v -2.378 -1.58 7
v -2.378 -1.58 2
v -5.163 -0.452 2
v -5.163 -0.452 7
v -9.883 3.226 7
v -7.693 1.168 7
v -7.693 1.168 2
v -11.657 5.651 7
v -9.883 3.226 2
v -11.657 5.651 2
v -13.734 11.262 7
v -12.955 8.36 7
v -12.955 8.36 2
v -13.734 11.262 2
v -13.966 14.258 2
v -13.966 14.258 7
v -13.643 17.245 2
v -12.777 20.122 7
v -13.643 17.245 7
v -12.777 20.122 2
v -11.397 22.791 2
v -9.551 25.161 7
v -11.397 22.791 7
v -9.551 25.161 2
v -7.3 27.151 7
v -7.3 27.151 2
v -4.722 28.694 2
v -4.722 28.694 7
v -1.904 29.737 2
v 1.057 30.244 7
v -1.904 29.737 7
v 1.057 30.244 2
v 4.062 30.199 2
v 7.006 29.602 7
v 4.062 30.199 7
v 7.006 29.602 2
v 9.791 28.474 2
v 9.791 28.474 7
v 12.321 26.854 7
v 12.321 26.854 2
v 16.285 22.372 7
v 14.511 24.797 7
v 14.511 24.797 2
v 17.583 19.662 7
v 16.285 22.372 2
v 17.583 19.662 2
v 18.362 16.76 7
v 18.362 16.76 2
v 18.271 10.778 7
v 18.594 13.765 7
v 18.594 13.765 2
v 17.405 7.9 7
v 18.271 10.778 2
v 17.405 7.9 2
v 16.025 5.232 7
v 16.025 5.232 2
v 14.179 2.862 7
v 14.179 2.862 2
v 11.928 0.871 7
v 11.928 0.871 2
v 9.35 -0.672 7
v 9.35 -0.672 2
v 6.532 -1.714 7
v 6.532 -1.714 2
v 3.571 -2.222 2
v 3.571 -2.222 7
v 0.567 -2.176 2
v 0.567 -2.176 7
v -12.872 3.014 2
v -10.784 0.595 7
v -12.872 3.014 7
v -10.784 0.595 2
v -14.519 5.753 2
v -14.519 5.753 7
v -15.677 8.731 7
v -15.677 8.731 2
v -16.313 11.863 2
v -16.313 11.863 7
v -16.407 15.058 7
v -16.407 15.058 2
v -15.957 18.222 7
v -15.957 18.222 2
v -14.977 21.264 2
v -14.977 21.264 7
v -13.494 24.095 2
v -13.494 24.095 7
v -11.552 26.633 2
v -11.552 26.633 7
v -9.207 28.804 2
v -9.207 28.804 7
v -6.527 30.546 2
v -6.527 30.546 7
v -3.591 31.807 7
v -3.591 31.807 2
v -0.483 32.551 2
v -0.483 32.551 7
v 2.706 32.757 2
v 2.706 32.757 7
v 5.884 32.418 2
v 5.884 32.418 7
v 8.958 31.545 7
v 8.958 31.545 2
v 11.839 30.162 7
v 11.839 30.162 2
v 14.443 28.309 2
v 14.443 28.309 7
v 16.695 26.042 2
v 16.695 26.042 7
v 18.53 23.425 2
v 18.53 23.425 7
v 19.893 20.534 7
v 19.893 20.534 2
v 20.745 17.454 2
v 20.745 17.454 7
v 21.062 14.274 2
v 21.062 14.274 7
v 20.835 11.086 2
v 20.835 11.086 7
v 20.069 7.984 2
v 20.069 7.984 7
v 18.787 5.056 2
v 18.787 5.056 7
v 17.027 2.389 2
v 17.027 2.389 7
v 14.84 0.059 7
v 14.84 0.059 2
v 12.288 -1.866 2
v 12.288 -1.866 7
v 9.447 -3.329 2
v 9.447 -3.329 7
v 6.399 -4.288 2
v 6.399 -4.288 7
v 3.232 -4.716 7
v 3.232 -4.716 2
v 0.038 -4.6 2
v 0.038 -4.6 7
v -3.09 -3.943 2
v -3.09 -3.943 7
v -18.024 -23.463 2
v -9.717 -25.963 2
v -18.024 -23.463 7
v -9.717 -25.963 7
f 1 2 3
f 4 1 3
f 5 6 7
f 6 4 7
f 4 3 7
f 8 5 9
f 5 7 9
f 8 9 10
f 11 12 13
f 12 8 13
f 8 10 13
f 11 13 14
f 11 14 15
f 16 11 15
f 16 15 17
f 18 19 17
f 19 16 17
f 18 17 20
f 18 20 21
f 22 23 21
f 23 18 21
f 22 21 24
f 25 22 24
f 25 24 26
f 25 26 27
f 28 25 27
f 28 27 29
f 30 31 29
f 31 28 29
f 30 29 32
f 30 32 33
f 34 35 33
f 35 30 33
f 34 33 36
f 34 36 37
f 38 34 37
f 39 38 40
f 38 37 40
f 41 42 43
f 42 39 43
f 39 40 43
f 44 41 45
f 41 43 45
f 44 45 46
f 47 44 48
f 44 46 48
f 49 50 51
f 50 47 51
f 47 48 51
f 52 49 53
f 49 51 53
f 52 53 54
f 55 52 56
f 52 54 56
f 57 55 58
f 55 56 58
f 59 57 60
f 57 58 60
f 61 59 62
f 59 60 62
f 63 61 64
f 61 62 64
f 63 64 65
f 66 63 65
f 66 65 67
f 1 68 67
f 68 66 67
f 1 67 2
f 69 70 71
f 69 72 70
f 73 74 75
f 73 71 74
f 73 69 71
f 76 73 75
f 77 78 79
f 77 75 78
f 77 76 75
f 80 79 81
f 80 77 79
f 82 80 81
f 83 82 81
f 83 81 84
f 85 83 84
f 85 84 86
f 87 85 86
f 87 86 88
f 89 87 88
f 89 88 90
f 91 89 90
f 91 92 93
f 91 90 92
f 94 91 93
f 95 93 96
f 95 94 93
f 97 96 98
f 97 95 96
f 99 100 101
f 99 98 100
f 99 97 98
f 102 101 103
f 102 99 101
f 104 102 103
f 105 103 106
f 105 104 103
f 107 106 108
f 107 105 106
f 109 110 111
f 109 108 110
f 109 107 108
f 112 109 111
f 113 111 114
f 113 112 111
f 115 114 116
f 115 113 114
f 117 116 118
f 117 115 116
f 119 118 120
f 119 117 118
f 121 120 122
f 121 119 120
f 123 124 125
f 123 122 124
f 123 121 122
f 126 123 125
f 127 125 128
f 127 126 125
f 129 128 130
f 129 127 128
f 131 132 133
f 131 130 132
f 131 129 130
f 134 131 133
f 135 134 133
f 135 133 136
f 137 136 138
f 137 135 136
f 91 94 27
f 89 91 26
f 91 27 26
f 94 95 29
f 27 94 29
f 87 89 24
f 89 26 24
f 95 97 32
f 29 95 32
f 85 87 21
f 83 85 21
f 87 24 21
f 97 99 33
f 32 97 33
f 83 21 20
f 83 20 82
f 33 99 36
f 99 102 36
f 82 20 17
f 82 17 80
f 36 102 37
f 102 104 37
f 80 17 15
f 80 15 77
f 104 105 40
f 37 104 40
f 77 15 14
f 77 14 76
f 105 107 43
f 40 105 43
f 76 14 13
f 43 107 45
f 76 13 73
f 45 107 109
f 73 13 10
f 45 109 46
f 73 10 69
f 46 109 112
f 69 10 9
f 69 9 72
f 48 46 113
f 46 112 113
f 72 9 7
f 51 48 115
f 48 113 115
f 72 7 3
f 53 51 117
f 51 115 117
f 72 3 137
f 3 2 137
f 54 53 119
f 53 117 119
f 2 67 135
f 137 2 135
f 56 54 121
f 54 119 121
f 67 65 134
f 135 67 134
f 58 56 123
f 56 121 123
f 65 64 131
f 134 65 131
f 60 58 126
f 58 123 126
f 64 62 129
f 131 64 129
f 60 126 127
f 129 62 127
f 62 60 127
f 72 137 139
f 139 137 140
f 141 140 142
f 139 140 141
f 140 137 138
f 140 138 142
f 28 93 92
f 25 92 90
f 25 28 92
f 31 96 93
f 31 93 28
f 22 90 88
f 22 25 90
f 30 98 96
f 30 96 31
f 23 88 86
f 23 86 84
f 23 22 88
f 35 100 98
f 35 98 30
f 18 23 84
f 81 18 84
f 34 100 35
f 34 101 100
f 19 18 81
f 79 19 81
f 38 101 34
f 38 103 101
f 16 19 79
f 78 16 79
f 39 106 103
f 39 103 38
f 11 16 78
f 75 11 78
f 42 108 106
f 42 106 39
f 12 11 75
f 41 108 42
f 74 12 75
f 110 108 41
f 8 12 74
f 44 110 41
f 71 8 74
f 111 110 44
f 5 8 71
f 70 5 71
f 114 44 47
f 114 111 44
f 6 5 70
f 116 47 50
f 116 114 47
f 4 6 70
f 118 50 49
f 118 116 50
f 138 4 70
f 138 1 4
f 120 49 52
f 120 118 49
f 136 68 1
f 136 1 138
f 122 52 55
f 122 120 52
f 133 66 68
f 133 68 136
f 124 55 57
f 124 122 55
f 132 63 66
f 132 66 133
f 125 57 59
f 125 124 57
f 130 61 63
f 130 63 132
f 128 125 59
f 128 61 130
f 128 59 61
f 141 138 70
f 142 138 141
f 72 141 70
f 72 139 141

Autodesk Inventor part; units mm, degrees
ref_plane "YZ Plane" through (0, 0, 0) normal (1, 0, 0) x (0, 1, 0)
ref_plane "XZ Plane" through (0, 0, 0) normal (0, 1, 0) x (-1, 0, 0)
ref_plane "XY Plane" through (0, 0, 0) normal (0, 0, 1) x (1, 0, 0)
ref_plane "Arbeitsebene1" through (-1.9028, 0, 2) normal (0, 0, 1) x (-0.2882, -0.9576, 0)
sketch "Skizze1" plane through (-1.9028, 0, 2) normal (0, 0, 1) x (-0.2882, -0.9576, 0)
  circle A0 centre (-14.632, 0) radius 18.75
  circle A1 centre (-14.632, 0) radius 15
  circle A2 centre (-14.632, 0) radius 16.2815
  line L0 (26.7708, -9) -> (26.7708, -29)
  line L1 (19.0208, -9) -> (26.7708, -9)
  line L2 (26.7708, -29) -> (19.0208, -29)
  line L3 (27.1135, -8.6759) -> (1.6495, -8.6759)
  line L4 (1.6495, -8.6759) -> (1.6495, 0)
  line L5 (1.6495, 0) -> (27.1135, 0)
  line L6 (27.1135, 0) -> (27.1135, -8.6759)
  point P0 (-12.7292, 0)
extrude "Extrusion1" add sketch "Skizze1" along normal blind 5 contours L5 L4 L3 A0 | L5 L6 L3 A0 | A0 L3 L4 L5
properties part number "15_Gabel"
